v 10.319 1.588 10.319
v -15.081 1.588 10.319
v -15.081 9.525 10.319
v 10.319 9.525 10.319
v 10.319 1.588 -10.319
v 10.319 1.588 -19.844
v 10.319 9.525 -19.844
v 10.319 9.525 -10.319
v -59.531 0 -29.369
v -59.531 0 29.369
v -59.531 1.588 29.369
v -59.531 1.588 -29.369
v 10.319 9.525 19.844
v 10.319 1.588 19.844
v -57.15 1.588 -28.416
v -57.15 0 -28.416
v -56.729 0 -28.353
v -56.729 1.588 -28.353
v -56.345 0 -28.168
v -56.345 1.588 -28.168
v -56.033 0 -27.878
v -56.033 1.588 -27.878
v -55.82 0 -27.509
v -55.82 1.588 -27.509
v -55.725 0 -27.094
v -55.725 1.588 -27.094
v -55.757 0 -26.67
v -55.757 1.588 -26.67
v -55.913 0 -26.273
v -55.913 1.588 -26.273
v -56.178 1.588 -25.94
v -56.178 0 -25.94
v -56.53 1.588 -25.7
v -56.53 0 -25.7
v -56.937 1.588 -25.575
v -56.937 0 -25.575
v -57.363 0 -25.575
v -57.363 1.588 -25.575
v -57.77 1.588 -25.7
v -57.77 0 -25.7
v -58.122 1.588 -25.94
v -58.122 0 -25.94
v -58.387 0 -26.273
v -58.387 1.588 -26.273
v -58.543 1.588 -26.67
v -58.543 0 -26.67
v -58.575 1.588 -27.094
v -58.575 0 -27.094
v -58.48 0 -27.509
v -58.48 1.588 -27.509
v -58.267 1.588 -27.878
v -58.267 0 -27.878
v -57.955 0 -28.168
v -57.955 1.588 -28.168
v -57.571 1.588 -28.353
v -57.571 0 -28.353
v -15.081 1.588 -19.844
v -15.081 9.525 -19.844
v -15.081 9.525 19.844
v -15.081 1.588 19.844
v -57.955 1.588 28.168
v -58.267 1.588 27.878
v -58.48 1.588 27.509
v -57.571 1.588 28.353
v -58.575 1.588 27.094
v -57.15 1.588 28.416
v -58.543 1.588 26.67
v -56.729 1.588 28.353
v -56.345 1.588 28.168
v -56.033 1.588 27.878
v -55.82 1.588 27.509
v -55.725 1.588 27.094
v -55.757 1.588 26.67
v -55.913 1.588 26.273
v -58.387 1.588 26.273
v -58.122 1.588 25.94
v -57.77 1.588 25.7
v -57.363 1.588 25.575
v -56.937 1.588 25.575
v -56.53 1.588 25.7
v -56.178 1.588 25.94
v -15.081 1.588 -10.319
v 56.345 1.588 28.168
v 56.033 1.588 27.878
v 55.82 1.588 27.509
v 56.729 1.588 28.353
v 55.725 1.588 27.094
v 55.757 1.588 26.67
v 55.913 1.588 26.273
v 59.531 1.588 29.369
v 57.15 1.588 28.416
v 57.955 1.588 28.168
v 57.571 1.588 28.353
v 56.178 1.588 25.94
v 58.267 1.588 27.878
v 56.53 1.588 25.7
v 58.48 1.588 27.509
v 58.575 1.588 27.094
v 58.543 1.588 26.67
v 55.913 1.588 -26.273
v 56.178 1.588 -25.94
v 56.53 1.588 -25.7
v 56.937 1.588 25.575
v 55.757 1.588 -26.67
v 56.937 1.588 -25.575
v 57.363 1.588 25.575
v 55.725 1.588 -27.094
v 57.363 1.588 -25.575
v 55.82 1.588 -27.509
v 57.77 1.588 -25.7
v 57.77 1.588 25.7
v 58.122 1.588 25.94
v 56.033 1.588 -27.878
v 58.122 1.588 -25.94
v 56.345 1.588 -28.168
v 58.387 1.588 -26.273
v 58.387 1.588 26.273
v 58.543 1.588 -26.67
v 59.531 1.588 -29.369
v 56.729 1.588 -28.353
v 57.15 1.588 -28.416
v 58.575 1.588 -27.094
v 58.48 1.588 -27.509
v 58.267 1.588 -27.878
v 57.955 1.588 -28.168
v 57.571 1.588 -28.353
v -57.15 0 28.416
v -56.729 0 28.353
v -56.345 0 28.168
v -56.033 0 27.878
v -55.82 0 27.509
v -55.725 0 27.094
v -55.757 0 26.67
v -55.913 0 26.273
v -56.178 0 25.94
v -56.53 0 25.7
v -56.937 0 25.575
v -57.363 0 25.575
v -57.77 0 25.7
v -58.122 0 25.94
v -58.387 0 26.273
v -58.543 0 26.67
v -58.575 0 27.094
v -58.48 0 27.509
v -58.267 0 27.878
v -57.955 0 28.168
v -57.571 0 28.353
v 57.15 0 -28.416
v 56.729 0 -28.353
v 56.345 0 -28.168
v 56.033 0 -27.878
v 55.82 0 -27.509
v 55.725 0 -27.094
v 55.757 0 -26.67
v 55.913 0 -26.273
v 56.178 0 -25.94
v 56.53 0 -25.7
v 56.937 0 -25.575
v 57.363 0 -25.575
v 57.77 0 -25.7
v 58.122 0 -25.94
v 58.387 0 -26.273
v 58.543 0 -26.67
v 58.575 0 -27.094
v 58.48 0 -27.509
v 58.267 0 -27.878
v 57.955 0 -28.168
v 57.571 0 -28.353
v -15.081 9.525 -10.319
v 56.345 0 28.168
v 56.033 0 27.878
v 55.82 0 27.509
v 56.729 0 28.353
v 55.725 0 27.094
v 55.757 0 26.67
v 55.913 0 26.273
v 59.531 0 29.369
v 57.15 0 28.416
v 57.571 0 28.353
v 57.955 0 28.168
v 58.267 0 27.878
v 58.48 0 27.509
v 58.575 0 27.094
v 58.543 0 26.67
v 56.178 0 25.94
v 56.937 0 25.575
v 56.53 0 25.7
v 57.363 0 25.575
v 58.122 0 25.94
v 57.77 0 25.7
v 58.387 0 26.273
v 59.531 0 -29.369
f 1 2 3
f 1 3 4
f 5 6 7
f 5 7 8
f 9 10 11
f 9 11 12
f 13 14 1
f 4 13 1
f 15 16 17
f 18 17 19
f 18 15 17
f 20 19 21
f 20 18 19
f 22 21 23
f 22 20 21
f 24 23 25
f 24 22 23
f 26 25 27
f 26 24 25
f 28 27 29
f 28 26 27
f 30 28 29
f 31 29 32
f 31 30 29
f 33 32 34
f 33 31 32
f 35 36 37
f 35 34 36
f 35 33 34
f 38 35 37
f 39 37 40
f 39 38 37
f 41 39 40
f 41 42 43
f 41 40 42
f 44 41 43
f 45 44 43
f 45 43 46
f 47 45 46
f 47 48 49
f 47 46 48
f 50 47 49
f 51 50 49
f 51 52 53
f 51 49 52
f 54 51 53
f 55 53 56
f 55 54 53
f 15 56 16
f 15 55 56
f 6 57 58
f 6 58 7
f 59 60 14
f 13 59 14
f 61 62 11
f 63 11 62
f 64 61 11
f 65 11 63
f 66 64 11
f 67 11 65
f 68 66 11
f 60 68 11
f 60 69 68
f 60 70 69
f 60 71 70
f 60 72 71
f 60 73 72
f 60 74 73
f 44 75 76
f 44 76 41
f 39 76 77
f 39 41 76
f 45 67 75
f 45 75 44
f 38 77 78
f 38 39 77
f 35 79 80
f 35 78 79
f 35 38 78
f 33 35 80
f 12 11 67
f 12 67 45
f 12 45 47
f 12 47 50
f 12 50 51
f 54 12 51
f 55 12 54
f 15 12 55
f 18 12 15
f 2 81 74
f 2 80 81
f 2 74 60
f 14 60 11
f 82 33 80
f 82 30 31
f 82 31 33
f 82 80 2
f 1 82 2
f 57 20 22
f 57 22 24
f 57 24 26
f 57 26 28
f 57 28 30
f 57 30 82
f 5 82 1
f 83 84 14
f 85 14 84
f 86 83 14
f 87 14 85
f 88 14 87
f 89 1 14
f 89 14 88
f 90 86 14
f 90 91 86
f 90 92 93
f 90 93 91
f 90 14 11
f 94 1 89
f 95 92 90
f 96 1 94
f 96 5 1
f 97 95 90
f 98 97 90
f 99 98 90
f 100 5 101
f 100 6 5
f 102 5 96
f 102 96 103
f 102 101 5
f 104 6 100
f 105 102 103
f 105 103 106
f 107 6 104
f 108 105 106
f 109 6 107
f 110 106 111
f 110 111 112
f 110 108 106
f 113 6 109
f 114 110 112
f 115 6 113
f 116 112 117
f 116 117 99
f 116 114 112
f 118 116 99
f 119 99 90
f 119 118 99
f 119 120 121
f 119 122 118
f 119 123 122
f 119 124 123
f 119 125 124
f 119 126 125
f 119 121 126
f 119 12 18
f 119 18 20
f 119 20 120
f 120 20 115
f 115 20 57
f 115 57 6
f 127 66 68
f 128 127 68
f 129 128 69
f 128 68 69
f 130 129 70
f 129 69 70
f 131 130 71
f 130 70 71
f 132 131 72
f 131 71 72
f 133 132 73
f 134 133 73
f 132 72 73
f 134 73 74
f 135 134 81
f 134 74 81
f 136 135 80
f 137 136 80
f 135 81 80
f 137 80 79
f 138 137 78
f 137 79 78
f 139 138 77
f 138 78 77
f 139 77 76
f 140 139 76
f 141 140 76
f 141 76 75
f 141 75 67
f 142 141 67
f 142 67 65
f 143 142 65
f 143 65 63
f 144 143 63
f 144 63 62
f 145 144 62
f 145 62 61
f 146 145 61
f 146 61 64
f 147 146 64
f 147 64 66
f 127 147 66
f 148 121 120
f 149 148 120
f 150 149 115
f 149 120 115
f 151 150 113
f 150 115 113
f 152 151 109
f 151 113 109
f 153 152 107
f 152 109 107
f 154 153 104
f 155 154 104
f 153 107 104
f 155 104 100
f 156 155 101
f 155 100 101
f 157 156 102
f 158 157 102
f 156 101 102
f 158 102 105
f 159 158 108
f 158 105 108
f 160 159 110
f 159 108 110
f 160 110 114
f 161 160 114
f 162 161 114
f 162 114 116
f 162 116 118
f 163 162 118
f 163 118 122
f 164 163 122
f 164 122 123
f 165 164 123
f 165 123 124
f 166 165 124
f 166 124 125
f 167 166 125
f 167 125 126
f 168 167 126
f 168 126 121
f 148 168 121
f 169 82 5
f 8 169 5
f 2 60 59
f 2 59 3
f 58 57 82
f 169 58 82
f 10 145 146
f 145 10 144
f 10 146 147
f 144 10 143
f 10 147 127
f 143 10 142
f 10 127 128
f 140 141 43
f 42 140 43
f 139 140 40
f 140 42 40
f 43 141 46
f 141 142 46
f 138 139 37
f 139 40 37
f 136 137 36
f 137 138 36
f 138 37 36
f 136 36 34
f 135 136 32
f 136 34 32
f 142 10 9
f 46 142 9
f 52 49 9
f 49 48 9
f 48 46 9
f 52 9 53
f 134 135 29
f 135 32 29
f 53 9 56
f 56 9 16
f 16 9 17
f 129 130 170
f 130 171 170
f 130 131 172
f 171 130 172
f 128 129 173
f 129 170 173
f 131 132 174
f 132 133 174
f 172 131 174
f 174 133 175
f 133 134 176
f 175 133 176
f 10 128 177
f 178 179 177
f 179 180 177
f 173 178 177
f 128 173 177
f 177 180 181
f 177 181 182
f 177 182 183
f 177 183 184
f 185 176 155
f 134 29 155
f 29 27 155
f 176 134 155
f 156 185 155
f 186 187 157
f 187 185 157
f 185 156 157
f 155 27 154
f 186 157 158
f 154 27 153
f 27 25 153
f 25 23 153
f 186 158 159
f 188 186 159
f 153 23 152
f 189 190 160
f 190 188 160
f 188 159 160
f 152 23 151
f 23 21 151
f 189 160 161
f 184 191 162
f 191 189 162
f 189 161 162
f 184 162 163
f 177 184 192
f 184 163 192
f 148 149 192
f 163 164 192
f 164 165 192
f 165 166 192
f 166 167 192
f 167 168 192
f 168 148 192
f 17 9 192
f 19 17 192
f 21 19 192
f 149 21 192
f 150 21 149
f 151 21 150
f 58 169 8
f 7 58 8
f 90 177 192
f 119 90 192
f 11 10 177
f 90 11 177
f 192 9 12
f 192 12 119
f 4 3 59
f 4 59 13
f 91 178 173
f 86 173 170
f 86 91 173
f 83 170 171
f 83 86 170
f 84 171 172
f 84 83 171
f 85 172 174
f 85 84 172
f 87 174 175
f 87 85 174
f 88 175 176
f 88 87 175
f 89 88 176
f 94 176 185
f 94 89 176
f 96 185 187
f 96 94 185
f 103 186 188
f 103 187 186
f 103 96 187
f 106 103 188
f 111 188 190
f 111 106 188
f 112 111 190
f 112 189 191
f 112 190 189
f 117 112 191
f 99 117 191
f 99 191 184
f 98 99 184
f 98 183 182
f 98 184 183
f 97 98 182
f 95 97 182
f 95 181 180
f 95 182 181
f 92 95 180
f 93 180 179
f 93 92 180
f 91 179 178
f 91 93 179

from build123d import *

# Parameters (mm, degrees)
SKETCH1_W                                  = 119.0625
SKETCH1_H                                  = 58.7375
BOSS_EXTRUDE1_DEPTH                        = 1.5875
SKETCH2_W                                  = 25.4
SKETCH2_H                                  = 9.525
BOSS_EXTRUDE2_DEPTH                        = 7.9375
SKETCH3_R                                  = 1.42875
CUT_EXTRUDE1_DEPTH                         = 67.854297613
MIRROR2_AT_THE_SECOND_PLANE_COPY_1_SKETC_R = 1.42875
MIRROR2_AT_THE_SECOND_PLANE_COPY_1_DEPTH   = 67.854297613


with BuildPart() as part:
    # Sketch1 → Boss-Extrude1 (new body)
    with BuildSketch(Plane(origin=(0, 0, 0), x_dir=(1, 0, 0), z_dir=(0, 1, 0))):
        Rectangle(SKETCH1_W, SKETCH1_H)
    extrude(amount=BOSS_EXTRUDE1_DEPTH)

    # Sketch2 → Boss-Extrude2 (add)
    with BuildSketch(Plane(origin=(0, 1.5875, 0), x_dir=(1, 0, 0), z_dir=(0, 1, 0))):
        with Locations((-2.38125, -15.08125)):
            Rectangle(SKETCH2_W, SKETCH2_H)
    boss_extrude2 = extrude(amount=BOSS_EXTRUDE2_DEPTH)

    # Mirror1: Boss-Extrude2 across plane
    add(boss_extrude2.mirror(Plane.XY))

    # Sketch3 → Cut-Extrude1 (cut, through all)
    with BuildSketch(Plane(origin=(0, 1.5875, 0), x_dir=(1, 0, 0), z_dir=(0, 1, 0))):
        with Locations(Location((-57.15, -26.9875, 0), (0, 0, 270))):
            Circle(SKETCH3_R)
    cut_extrude1 = extrude(amount=-CUT_EXTRUDE1_DEPTH, mode=Mode.SUBTRACT)

    # Mirror2: Cut-Extrude1 across plane
    add(cut_extrude1.mirror(Plane(origin=(0, 0, 0), x_dir=(0, 0, 1), z_dir=(1, 0, 0))), mode=Mode.SUBTRACT)

    # Mirror2 at the second plane: Cut-Extrude1 across plane
    add(cut_extrude1.mirror(Plane.XY), mode=Mode.SUBTRACT)

    # Mirror2 at the second plane copy 1 sketc → Mirror2 at the second plane copy 1 (cut, through all)
    with BuildSketch(Plane(origin=(0, 1.5875, 0), x_dir=(-1, 0, 0), z_dir=(0, 1, 0))):
        with Locations(Location((-57.15, -26.9875, 0), (0, 0, 270))):
            Circle(MIRROR2_AT_THE_SECOND_PLANE_COPY_1_SKETC_R)
    extrude(amount=-MIRROR2_AT_THE_SECOND_PLANE_COPY_1_DEPTH, mode=Mode.SUBTRACT)


solid = part.part
